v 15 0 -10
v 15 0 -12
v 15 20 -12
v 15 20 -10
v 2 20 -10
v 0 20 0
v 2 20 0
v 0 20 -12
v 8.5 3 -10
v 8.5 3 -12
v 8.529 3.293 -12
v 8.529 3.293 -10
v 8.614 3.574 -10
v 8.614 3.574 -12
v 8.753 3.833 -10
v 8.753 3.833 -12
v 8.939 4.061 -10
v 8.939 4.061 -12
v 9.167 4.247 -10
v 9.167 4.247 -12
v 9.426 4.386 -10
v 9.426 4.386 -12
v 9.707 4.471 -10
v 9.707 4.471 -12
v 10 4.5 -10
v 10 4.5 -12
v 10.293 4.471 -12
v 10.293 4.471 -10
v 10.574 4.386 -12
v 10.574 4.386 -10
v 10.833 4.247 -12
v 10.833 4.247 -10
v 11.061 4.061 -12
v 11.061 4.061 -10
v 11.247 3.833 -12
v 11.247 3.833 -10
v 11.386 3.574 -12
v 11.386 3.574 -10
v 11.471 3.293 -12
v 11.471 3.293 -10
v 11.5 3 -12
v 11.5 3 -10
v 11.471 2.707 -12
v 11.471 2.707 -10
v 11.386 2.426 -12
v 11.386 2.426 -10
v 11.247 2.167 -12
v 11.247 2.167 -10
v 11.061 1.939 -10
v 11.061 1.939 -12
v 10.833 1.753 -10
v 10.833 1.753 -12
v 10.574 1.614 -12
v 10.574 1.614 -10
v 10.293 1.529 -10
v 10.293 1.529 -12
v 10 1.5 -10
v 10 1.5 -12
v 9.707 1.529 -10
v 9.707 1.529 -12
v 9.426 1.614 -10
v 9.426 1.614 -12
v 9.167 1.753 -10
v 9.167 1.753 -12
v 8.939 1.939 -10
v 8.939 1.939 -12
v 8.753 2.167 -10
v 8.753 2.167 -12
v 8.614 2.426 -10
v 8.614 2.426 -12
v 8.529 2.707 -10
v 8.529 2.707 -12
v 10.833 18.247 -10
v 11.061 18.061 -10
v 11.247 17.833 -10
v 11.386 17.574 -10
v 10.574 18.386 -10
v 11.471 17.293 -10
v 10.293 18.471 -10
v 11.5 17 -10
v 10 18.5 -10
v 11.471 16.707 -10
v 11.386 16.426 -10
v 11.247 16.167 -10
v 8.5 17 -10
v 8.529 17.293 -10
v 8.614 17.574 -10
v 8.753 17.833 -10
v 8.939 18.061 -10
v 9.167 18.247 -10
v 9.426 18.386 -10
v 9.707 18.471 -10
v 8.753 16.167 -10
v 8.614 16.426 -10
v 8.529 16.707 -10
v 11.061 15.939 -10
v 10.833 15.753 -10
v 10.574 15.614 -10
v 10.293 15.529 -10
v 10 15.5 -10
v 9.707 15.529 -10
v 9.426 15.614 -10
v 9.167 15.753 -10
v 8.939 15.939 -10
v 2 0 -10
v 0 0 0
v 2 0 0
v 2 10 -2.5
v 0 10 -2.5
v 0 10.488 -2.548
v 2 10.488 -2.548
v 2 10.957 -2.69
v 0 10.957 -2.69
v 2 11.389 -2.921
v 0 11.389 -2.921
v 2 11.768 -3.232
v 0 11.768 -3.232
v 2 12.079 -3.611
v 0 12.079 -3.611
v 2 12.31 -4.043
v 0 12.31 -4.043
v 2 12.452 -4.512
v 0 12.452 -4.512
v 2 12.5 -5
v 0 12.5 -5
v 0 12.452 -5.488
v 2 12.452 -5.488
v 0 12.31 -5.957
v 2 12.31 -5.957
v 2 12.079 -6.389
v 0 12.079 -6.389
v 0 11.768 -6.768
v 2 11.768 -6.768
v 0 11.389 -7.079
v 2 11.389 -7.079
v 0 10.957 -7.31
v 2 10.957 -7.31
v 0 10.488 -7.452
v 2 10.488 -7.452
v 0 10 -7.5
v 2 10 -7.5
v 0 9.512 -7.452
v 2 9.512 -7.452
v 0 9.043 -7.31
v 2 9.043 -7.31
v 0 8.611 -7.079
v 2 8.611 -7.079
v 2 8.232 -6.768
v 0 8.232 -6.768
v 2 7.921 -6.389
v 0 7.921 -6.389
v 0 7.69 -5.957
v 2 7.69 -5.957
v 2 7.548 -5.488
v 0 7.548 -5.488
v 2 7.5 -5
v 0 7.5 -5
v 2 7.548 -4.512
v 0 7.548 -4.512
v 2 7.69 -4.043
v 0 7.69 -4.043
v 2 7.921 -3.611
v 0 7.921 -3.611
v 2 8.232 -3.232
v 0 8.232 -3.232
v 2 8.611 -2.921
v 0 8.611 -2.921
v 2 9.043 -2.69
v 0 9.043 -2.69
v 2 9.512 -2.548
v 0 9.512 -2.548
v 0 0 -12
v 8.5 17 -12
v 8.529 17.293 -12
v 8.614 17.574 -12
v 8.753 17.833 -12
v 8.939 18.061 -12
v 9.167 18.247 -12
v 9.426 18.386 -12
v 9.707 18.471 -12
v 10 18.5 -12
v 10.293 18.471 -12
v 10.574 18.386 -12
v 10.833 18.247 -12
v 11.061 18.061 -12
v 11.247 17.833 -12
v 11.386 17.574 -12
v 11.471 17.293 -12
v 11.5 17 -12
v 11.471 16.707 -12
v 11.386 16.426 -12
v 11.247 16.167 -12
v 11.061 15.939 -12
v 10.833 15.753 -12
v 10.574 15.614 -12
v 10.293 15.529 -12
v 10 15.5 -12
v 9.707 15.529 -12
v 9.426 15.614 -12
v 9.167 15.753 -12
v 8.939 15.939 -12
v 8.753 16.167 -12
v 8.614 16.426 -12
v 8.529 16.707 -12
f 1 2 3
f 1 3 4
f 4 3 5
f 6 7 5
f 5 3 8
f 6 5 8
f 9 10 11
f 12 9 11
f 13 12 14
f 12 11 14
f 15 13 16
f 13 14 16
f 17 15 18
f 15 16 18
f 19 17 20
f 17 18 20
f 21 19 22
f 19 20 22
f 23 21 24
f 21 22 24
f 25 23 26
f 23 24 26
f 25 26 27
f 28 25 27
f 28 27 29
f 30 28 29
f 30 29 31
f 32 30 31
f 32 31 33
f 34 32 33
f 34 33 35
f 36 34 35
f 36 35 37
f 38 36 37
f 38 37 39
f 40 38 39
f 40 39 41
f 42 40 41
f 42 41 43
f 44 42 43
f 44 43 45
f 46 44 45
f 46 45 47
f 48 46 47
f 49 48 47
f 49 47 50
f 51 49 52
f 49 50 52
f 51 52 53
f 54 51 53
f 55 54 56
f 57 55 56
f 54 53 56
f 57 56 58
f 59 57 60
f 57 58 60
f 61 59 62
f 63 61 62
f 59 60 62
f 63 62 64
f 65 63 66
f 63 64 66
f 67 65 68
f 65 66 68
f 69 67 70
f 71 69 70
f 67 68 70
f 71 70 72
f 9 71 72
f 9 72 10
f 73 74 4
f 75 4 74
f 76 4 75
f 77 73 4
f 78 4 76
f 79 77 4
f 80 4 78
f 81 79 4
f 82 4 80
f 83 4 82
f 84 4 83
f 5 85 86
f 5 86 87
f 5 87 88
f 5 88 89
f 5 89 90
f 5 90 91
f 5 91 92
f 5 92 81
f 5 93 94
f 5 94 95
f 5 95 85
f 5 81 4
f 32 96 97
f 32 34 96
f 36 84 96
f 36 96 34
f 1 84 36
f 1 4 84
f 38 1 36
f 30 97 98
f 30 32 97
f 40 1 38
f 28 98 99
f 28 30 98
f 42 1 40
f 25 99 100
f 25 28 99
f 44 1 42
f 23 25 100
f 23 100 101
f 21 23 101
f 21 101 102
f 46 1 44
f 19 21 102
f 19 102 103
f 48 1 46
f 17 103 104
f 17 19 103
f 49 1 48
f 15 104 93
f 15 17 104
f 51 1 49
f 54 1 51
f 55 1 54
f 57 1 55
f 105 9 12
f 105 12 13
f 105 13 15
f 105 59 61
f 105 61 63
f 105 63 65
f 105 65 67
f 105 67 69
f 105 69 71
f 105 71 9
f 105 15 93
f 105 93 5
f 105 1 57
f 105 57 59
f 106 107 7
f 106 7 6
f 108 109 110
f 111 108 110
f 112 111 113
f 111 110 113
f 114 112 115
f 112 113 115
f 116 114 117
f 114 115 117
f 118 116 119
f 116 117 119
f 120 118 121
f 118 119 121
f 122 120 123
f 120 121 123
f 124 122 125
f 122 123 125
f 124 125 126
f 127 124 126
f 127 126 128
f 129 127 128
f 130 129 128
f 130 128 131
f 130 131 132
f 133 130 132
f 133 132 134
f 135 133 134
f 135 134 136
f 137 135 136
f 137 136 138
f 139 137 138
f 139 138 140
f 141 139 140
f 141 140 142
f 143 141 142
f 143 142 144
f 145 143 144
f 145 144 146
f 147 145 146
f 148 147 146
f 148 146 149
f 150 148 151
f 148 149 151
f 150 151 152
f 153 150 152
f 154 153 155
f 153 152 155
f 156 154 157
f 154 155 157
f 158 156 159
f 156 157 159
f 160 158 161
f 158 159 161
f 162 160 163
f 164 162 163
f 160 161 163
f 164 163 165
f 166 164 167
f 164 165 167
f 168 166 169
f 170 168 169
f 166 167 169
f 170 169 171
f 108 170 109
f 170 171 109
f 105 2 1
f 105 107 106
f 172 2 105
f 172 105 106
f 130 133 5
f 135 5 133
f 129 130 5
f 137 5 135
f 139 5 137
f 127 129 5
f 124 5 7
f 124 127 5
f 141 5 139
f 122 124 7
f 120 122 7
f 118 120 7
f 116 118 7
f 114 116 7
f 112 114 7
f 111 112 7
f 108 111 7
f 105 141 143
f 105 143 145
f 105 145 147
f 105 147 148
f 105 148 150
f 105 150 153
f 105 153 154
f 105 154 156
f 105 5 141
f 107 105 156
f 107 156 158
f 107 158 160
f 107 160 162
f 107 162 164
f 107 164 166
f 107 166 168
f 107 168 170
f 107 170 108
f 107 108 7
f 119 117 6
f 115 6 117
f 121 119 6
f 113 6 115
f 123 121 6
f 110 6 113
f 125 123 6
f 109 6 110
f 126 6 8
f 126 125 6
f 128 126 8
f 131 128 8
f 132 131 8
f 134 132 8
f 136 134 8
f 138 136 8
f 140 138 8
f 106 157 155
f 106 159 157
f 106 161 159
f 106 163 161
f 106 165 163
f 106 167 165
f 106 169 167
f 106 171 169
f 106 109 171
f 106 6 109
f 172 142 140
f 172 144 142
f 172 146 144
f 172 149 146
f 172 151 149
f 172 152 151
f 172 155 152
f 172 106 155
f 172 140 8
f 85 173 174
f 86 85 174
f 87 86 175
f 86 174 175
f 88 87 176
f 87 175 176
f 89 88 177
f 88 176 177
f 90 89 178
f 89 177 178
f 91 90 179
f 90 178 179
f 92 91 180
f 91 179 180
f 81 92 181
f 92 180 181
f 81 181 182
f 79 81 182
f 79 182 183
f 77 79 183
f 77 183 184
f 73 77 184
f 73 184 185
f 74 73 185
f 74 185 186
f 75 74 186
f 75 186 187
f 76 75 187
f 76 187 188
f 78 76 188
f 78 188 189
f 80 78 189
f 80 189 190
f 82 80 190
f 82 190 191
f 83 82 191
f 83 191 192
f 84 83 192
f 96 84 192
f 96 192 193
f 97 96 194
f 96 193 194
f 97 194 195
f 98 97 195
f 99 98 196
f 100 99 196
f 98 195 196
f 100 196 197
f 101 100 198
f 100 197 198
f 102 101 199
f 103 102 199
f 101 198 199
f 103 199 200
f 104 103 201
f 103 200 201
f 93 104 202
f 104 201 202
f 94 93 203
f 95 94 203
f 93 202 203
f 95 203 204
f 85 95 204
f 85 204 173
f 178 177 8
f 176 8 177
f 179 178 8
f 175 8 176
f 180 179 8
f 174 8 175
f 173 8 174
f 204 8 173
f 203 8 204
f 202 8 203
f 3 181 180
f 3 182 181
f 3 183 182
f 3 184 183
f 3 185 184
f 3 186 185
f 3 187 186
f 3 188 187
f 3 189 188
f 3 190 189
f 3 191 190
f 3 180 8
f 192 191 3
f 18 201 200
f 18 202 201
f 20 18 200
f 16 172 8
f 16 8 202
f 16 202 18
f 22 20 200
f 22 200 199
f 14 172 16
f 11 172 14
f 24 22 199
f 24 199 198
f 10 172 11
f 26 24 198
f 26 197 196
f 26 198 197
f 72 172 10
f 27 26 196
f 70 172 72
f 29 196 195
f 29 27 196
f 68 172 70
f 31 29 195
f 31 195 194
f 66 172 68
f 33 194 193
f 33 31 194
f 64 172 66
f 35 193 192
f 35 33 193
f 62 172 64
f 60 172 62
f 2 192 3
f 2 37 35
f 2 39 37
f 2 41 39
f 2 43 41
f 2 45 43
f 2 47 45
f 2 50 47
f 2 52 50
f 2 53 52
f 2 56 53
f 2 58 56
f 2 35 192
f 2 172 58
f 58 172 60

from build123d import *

# Parameters (mm, degrees)
EXTRUDE_THIN1_DEPTH = 20
SKETCH2_R           = 2.5
CUT_EXTRUDE1_DEPTH  = 10
SKETCH3_R           = 1.5
CUT_EXTRUDE2_DEPTH  = 10


with BuildPart() as part:
    # Sketch1 → Extrude-Thin1 (new body)
    with BuildSketch(Plane(origin=(0, 0, 0), x_dir=(1, 0, 0), z_dir=(0, 1, 0))):
        Polygon((0, 0), (0, 12), (15, 12), (15, 10), (2, 10), (2, 0), align=None)
    extrude(amount=EXTRUDE_THIN1_DEPTH)

    # Sketch2 → Cut-Extrude1 (cut)
    with BuildSketch(Plane.ZY):
        with Locations((-5, 10)):
            Circle(SKETCH2_R)
    extrude(amount=-CUT_EXTRUDE1_DEPTH, mode=Mode.SUBTRACT)

    # Sketch3 → Cut-Extrude2 (cut)
    with BuildSketch(Plane(origin=(0, 0, -12), x_dir=(-1, 0, 0), z_dir=(0, 0, -1))):
        with Locations((-10, 17)):
            Circle(SKETCH3_R)
        with Locations((-10, 3)):
            Circle(SKETCH3_R)
    extrude(amount=-CUT_EXTRUDE2_DEPTH, mode=Mode.SUBTRACT)


solid = part.part
